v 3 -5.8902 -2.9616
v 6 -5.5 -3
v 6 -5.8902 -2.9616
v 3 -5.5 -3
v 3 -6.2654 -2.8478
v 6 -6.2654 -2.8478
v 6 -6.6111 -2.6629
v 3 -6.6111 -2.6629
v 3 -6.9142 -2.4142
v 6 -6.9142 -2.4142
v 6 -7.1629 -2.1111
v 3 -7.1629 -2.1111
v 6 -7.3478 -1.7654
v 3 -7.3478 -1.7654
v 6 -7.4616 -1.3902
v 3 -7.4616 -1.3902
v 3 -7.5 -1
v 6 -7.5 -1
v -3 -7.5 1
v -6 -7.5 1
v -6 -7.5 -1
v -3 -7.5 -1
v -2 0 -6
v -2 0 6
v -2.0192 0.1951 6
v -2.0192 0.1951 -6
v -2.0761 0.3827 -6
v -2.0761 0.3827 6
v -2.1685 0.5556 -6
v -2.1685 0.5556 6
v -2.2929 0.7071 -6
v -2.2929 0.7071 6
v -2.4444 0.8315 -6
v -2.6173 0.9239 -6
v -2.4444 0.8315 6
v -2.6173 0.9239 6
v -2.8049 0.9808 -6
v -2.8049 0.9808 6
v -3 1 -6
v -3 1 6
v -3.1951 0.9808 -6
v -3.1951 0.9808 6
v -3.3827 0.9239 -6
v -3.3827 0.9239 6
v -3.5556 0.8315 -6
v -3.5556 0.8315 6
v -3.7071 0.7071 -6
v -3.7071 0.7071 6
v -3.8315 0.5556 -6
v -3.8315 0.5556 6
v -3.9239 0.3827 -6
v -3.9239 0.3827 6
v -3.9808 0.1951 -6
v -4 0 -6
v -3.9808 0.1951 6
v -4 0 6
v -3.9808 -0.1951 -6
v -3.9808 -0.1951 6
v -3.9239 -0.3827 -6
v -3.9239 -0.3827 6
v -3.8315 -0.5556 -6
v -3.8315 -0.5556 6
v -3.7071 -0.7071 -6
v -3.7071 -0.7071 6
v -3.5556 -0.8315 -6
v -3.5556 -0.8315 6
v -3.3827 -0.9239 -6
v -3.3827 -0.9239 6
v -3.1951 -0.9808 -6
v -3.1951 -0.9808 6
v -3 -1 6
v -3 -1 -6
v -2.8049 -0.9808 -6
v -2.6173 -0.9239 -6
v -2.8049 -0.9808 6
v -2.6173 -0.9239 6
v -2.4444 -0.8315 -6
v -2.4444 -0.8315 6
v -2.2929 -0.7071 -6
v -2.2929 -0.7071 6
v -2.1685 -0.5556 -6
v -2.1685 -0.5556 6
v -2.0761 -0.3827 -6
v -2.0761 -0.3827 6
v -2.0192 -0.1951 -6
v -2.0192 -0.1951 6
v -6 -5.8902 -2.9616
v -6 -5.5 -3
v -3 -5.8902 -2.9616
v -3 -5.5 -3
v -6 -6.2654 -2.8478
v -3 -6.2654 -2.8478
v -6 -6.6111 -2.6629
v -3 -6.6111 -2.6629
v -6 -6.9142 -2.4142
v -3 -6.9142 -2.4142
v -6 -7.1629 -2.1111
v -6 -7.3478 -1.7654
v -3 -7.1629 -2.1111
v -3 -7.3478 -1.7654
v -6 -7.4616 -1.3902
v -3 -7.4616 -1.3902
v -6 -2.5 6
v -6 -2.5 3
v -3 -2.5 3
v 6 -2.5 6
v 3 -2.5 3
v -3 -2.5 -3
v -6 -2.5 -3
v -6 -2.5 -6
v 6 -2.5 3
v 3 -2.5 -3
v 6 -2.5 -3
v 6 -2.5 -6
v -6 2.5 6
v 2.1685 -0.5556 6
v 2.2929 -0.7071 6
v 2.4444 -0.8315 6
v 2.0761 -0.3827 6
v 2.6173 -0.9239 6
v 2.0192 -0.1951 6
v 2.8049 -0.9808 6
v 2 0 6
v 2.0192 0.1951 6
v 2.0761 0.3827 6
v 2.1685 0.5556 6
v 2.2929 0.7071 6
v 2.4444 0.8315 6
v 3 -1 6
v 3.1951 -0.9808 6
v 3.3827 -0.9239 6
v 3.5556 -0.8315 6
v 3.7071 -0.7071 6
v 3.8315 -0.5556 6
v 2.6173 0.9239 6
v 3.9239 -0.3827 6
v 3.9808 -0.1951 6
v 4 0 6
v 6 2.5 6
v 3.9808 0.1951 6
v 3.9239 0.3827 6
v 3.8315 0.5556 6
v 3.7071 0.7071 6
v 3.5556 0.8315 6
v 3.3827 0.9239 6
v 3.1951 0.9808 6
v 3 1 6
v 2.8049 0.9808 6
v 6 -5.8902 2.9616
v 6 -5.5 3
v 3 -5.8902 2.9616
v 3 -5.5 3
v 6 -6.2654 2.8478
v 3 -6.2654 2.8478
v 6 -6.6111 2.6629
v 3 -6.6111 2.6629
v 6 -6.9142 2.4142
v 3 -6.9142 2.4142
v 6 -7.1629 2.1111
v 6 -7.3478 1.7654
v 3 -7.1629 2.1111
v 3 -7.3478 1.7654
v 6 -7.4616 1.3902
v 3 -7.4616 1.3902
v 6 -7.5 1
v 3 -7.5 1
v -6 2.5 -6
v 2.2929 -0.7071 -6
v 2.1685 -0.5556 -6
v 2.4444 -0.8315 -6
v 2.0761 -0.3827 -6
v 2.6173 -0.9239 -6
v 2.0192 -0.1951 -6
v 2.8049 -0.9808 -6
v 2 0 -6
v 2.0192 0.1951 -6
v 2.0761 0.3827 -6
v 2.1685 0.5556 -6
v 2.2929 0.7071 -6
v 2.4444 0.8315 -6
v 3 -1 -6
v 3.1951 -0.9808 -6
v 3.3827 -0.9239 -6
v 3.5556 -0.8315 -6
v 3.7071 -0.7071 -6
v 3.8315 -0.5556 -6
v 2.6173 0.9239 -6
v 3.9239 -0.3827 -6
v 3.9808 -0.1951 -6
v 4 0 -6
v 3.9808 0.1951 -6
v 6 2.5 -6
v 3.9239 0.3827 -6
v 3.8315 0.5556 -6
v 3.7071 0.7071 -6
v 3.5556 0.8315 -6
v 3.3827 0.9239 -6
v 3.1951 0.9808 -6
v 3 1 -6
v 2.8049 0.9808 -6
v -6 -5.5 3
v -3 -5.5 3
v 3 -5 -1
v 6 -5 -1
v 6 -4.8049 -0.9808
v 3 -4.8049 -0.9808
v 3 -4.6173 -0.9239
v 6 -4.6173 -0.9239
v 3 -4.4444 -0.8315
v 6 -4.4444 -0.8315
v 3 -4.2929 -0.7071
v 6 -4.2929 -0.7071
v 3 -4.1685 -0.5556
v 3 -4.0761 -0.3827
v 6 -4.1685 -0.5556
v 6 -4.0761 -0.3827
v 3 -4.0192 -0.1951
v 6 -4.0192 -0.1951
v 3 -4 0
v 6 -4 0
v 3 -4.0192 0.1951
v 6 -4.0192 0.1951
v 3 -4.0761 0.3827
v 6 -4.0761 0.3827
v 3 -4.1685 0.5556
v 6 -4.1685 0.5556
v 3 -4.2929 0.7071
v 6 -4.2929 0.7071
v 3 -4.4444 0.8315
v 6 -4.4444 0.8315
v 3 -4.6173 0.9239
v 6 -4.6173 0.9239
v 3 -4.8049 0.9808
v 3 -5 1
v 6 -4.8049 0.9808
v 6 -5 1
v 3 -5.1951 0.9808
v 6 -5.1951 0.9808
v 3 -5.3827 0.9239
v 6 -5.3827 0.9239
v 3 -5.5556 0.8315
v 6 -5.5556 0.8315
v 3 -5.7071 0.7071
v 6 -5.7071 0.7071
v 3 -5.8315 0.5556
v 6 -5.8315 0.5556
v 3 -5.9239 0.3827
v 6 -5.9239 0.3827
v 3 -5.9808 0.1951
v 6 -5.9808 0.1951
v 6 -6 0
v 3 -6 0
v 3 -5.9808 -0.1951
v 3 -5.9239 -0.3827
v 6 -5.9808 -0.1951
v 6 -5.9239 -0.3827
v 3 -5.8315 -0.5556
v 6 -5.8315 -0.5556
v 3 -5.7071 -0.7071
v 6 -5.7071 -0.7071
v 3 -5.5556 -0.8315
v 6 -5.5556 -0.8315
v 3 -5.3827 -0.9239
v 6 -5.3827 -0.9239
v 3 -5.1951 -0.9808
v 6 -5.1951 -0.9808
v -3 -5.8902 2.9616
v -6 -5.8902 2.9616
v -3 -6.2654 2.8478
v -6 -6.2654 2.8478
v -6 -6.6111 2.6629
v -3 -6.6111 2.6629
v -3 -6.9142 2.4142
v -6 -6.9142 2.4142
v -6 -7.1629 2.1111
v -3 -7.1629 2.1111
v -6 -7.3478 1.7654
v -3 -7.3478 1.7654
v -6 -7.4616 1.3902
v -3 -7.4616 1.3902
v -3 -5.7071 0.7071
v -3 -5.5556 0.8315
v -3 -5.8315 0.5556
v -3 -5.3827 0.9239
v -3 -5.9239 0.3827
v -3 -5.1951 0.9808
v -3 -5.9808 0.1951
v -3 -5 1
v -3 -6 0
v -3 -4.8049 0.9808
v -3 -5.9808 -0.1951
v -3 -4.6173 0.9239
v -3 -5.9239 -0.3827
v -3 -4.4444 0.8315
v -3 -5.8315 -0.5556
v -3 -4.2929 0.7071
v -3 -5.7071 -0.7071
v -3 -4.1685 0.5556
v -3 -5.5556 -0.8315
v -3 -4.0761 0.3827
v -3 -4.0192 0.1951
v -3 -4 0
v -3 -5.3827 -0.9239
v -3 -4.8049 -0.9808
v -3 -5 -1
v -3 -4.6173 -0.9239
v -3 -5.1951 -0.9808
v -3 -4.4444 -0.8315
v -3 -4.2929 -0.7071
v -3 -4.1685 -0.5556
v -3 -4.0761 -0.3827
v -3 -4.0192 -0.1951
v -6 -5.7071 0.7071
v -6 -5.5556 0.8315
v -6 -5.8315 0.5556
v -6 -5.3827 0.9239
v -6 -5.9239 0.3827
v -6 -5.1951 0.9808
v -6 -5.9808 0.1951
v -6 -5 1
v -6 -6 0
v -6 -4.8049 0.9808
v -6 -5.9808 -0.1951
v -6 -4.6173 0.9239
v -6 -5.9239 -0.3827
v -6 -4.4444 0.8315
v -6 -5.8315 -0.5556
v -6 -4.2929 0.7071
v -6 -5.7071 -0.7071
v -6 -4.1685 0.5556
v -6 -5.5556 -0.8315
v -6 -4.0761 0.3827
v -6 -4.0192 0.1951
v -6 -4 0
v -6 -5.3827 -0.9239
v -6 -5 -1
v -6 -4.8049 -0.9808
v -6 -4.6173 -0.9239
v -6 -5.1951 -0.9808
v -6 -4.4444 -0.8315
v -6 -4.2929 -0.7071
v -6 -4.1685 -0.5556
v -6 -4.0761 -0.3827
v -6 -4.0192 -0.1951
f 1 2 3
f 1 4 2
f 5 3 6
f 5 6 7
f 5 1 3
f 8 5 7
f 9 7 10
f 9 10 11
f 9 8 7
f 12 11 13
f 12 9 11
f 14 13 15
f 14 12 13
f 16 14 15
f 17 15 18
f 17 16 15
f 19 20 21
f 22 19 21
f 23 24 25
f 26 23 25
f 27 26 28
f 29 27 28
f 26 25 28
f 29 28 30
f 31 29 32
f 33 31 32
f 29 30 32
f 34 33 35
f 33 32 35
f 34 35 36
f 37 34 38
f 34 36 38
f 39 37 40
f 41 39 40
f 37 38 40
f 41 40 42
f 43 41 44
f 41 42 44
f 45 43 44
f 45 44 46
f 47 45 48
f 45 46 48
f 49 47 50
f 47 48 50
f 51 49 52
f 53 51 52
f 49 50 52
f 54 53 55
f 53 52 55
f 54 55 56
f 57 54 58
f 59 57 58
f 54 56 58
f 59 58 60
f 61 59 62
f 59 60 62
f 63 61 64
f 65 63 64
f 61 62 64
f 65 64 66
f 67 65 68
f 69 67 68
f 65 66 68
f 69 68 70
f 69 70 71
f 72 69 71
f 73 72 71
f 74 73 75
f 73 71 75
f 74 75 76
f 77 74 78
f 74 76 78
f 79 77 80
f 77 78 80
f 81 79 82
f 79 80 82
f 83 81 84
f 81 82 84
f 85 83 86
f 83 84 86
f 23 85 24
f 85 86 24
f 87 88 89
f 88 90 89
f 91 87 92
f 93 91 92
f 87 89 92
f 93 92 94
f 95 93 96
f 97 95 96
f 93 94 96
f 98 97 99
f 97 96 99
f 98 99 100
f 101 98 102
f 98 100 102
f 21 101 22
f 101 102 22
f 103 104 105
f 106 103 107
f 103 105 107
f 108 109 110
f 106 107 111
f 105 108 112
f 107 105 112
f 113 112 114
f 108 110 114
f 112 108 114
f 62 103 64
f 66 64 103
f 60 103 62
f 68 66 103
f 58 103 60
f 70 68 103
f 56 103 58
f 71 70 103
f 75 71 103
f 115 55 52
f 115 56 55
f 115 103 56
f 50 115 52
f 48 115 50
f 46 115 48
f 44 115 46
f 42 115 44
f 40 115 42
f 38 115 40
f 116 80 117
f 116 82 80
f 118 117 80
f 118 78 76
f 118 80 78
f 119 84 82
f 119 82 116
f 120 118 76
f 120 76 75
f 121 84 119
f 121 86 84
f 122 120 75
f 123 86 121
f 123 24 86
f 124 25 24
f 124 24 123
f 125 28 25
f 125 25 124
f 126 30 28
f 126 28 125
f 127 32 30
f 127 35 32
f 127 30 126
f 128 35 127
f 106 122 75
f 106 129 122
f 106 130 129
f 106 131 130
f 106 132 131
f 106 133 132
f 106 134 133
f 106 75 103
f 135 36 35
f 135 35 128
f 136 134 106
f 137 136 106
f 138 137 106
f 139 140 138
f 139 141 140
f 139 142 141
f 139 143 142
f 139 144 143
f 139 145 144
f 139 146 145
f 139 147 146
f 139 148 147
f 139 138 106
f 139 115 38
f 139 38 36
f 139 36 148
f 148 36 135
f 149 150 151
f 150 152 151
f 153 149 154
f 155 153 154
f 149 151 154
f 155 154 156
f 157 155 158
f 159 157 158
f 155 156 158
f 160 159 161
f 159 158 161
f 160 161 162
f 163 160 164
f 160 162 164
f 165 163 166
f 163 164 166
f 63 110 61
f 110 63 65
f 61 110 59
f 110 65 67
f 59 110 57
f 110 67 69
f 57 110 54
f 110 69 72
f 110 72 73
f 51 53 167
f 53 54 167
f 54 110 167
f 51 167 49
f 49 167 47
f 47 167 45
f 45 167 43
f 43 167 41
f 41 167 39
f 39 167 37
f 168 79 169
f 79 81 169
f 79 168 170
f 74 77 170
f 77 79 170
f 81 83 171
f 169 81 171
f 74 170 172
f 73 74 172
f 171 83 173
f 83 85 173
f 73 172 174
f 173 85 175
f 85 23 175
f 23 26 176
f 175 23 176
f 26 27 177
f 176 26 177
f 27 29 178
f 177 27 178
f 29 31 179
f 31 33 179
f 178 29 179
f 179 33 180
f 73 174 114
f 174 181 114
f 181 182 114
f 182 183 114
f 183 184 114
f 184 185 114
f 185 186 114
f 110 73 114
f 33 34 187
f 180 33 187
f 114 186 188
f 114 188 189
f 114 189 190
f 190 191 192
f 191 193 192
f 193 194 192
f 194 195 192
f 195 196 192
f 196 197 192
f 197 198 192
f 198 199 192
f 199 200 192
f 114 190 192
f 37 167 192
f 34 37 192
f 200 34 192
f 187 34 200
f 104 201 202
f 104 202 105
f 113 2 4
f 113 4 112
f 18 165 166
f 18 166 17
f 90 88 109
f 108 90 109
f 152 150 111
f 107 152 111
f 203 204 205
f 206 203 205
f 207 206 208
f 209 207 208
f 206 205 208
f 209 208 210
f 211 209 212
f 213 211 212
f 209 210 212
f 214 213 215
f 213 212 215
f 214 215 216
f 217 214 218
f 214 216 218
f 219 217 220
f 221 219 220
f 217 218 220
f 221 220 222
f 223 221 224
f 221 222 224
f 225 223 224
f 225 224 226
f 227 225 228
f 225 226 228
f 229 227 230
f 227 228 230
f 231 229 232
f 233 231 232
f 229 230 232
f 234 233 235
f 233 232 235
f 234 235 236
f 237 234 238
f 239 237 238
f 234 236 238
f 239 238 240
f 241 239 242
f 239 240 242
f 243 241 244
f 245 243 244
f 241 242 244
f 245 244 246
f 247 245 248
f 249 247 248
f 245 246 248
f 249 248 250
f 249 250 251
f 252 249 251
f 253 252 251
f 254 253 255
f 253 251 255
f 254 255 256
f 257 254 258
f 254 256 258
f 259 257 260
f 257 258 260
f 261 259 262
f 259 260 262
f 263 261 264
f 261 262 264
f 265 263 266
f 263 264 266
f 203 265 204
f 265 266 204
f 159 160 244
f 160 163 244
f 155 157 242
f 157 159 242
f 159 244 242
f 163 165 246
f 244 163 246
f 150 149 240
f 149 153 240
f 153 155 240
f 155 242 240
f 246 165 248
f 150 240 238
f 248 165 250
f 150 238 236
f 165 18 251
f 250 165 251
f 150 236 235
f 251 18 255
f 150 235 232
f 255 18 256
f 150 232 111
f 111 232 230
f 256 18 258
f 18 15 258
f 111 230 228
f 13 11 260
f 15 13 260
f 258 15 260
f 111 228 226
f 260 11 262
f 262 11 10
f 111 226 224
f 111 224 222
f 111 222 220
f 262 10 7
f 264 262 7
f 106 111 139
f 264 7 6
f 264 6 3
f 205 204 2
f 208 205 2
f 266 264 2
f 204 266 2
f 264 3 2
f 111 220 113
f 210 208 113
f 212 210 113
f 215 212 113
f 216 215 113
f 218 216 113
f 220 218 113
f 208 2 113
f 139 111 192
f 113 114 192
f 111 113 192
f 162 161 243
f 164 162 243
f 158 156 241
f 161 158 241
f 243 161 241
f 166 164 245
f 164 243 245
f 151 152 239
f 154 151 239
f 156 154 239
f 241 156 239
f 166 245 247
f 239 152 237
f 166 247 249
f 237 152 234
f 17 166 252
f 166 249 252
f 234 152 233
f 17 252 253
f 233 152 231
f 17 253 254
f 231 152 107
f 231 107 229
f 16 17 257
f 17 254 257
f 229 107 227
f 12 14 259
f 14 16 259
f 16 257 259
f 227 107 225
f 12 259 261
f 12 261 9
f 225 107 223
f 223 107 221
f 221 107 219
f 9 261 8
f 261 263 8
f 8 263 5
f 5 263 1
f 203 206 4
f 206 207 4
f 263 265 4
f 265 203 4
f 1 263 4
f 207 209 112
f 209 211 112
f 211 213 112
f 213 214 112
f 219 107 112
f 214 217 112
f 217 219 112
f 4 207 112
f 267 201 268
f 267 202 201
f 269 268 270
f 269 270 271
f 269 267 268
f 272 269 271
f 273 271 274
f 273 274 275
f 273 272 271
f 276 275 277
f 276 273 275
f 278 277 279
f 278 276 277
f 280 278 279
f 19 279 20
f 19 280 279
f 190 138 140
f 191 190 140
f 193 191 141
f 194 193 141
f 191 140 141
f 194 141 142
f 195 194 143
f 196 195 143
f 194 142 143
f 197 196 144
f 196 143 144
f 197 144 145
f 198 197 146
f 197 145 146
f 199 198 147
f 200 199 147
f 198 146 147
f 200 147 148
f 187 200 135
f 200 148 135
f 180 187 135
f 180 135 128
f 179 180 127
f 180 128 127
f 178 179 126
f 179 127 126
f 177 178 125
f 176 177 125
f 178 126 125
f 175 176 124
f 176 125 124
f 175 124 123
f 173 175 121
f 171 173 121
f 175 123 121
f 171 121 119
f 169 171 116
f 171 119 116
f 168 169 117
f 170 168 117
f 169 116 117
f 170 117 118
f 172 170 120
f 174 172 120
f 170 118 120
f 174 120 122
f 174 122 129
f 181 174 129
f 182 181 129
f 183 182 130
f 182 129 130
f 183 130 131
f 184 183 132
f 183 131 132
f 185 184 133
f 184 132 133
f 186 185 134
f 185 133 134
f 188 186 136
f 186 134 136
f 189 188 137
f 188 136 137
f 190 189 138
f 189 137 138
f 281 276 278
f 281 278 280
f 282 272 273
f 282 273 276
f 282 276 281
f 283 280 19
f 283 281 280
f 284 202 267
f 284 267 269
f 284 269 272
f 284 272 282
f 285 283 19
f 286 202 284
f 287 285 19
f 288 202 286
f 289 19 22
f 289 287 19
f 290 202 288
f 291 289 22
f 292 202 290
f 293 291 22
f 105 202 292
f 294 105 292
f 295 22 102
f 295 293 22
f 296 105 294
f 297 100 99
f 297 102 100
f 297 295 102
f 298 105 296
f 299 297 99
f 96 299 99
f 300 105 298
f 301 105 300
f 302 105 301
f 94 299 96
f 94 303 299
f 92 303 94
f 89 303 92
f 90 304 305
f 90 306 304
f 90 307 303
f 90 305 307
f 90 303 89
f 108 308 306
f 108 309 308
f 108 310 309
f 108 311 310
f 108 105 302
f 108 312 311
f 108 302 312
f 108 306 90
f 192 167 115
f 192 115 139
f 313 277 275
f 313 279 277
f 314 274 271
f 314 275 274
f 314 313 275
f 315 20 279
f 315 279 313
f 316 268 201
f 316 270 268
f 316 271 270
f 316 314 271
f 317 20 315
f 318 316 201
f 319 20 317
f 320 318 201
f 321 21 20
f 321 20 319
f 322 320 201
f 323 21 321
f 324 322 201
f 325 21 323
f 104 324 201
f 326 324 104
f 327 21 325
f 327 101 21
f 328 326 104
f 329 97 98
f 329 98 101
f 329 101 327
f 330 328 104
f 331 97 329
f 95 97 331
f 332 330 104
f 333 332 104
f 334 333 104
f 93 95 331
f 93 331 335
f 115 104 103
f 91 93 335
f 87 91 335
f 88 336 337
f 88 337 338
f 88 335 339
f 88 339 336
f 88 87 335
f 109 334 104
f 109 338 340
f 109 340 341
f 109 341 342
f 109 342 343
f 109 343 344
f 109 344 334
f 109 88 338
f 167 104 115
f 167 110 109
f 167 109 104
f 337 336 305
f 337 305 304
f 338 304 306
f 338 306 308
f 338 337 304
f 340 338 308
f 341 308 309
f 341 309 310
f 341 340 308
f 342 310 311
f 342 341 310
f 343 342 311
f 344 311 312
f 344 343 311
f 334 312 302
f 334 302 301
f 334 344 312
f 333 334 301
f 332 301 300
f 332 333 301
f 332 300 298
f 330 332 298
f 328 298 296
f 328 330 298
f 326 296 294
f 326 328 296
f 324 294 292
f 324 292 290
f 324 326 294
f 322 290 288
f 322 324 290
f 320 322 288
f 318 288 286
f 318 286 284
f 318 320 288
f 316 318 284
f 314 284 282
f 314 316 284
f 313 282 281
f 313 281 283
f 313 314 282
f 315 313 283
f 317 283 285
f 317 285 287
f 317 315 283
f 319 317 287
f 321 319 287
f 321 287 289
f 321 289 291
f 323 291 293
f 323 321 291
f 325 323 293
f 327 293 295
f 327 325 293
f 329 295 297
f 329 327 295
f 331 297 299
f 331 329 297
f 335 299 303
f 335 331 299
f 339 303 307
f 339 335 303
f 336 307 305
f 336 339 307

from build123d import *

# Parameters (mm, degrees)
BOSS_EXTRUDE1_DEPTH      = 6
BOSS_EXTRUDE1_DEPTH_BACK = 6
SKETCH1_W                = 12
SKETCH1_H                = 5
SKETCH2_R                = 1
CUT_EXTRUDE1_DEPTH       = 12
SKETCH3_W                = 6
SKETCH3_H                = 5
SKETCH3_R                = 1
BOSS_EXTRUDE2_DEPTH      = 3
FILLET1_R                = 2
FILLET1_OF_MIRROR1_R     = 2


with BuildPart() as part:
    # Sketch1 → Boss-Extrude1 (new, two sides: drawn at the far end of the back side and taken through both)
    with BuildSketch(Plane.XY.offset(-BOSS_EXTRUDE1_DEPTH_BACK)):
        Rectangle(SKETCH1_W, SKETCH1_H)
    extrude(amount=BOSS_EXTRUDE1_DEPTH + BOSS_EXTRUDE1_DEPTH_BACK)

    # Sketch2 → Cut-Extrude1 (cut)
    with BuildSketch(Plane.XY.offset(6)):
        with Locations((-3, 0)):
            Circle(SKETCH2_R)
        with Locations((3, 0)):
            Circle(SKETCH2_R)
    extrude(amount=-CUT_EXTRUDE1_DEPTH, mode=Mode.SUBTRACT)

    # Sketch3 → Boss-Extrude2 (add)
    with BuildSketch(Plane(origin=(6, 0, 0), x_dir=(0, 0, -1), z_dir=(1, 0, 0))):
        with Locations((0, -5)):
            Rectangle(SKETCH3_W, SKETCH3_H)
        with Locations((0, -5)):
            Circle(SKETCH3_R, mode=Mode.SUBTRACT)
    boss_extrude2 = extrude(amount=-BOSS_EXTRUDE2_DEPTH)

    # Fillet1
    fillet1_edges = [part.edges().sort_by_distance(p)[0] for p in [
        (4.5, -7.5, 3),
        (4.5, -7.5, -3),
    ]]
    fillet(fillet1_edges, radius=FILLET1_R)

    # Mirror1: Boss-Extrude2 across plane
    add(boss_extrude2.mirror(Plane(origin=(0, 0, 0), x_dir=(0, 0, 1), z_dir=(1, 0, 0))))

    # Fillet1 of Mirror1
    fillet1_of_mirror1_edges = [part.edges().sort_by_distance(p)[0] for p in [
        (-4.5, -7.5, 3),
        (-4.5, -7.5, -3),
    ]]
    fillet(fillet1_of_mirror1_edges, radius=FILLET1_OF_MIRROR1_R)


solid = part.part
